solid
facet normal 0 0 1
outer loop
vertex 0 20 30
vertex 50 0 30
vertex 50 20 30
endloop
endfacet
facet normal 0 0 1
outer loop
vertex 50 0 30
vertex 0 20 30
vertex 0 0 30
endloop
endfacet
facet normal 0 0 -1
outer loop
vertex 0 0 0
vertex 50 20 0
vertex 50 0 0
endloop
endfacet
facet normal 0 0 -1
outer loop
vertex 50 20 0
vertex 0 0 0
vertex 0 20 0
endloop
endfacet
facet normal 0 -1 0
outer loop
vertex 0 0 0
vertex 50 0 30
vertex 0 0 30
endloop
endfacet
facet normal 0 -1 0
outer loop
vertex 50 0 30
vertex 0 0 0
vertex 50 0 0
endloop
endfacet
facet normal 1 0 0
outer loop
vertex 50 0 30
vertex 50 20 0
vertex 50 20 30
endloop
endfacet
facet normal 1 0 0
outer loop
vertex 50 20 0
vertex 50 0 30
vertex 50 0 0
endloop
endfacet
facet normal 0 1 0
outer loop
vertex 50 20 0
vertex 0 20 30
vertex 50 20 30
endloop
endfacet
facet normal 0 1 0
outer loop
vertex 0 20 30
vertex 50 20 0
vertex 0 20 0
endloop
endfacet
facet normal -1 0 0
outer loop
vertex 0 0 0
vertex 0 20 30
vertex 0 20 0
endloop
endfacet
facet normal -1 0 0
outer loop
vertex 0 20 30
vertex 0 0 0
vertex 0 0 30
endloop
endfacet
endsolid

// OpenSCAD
ancho = 50;
alto = 30;
profundidad = 20;

cube([ancho, profundidad, alto]);
